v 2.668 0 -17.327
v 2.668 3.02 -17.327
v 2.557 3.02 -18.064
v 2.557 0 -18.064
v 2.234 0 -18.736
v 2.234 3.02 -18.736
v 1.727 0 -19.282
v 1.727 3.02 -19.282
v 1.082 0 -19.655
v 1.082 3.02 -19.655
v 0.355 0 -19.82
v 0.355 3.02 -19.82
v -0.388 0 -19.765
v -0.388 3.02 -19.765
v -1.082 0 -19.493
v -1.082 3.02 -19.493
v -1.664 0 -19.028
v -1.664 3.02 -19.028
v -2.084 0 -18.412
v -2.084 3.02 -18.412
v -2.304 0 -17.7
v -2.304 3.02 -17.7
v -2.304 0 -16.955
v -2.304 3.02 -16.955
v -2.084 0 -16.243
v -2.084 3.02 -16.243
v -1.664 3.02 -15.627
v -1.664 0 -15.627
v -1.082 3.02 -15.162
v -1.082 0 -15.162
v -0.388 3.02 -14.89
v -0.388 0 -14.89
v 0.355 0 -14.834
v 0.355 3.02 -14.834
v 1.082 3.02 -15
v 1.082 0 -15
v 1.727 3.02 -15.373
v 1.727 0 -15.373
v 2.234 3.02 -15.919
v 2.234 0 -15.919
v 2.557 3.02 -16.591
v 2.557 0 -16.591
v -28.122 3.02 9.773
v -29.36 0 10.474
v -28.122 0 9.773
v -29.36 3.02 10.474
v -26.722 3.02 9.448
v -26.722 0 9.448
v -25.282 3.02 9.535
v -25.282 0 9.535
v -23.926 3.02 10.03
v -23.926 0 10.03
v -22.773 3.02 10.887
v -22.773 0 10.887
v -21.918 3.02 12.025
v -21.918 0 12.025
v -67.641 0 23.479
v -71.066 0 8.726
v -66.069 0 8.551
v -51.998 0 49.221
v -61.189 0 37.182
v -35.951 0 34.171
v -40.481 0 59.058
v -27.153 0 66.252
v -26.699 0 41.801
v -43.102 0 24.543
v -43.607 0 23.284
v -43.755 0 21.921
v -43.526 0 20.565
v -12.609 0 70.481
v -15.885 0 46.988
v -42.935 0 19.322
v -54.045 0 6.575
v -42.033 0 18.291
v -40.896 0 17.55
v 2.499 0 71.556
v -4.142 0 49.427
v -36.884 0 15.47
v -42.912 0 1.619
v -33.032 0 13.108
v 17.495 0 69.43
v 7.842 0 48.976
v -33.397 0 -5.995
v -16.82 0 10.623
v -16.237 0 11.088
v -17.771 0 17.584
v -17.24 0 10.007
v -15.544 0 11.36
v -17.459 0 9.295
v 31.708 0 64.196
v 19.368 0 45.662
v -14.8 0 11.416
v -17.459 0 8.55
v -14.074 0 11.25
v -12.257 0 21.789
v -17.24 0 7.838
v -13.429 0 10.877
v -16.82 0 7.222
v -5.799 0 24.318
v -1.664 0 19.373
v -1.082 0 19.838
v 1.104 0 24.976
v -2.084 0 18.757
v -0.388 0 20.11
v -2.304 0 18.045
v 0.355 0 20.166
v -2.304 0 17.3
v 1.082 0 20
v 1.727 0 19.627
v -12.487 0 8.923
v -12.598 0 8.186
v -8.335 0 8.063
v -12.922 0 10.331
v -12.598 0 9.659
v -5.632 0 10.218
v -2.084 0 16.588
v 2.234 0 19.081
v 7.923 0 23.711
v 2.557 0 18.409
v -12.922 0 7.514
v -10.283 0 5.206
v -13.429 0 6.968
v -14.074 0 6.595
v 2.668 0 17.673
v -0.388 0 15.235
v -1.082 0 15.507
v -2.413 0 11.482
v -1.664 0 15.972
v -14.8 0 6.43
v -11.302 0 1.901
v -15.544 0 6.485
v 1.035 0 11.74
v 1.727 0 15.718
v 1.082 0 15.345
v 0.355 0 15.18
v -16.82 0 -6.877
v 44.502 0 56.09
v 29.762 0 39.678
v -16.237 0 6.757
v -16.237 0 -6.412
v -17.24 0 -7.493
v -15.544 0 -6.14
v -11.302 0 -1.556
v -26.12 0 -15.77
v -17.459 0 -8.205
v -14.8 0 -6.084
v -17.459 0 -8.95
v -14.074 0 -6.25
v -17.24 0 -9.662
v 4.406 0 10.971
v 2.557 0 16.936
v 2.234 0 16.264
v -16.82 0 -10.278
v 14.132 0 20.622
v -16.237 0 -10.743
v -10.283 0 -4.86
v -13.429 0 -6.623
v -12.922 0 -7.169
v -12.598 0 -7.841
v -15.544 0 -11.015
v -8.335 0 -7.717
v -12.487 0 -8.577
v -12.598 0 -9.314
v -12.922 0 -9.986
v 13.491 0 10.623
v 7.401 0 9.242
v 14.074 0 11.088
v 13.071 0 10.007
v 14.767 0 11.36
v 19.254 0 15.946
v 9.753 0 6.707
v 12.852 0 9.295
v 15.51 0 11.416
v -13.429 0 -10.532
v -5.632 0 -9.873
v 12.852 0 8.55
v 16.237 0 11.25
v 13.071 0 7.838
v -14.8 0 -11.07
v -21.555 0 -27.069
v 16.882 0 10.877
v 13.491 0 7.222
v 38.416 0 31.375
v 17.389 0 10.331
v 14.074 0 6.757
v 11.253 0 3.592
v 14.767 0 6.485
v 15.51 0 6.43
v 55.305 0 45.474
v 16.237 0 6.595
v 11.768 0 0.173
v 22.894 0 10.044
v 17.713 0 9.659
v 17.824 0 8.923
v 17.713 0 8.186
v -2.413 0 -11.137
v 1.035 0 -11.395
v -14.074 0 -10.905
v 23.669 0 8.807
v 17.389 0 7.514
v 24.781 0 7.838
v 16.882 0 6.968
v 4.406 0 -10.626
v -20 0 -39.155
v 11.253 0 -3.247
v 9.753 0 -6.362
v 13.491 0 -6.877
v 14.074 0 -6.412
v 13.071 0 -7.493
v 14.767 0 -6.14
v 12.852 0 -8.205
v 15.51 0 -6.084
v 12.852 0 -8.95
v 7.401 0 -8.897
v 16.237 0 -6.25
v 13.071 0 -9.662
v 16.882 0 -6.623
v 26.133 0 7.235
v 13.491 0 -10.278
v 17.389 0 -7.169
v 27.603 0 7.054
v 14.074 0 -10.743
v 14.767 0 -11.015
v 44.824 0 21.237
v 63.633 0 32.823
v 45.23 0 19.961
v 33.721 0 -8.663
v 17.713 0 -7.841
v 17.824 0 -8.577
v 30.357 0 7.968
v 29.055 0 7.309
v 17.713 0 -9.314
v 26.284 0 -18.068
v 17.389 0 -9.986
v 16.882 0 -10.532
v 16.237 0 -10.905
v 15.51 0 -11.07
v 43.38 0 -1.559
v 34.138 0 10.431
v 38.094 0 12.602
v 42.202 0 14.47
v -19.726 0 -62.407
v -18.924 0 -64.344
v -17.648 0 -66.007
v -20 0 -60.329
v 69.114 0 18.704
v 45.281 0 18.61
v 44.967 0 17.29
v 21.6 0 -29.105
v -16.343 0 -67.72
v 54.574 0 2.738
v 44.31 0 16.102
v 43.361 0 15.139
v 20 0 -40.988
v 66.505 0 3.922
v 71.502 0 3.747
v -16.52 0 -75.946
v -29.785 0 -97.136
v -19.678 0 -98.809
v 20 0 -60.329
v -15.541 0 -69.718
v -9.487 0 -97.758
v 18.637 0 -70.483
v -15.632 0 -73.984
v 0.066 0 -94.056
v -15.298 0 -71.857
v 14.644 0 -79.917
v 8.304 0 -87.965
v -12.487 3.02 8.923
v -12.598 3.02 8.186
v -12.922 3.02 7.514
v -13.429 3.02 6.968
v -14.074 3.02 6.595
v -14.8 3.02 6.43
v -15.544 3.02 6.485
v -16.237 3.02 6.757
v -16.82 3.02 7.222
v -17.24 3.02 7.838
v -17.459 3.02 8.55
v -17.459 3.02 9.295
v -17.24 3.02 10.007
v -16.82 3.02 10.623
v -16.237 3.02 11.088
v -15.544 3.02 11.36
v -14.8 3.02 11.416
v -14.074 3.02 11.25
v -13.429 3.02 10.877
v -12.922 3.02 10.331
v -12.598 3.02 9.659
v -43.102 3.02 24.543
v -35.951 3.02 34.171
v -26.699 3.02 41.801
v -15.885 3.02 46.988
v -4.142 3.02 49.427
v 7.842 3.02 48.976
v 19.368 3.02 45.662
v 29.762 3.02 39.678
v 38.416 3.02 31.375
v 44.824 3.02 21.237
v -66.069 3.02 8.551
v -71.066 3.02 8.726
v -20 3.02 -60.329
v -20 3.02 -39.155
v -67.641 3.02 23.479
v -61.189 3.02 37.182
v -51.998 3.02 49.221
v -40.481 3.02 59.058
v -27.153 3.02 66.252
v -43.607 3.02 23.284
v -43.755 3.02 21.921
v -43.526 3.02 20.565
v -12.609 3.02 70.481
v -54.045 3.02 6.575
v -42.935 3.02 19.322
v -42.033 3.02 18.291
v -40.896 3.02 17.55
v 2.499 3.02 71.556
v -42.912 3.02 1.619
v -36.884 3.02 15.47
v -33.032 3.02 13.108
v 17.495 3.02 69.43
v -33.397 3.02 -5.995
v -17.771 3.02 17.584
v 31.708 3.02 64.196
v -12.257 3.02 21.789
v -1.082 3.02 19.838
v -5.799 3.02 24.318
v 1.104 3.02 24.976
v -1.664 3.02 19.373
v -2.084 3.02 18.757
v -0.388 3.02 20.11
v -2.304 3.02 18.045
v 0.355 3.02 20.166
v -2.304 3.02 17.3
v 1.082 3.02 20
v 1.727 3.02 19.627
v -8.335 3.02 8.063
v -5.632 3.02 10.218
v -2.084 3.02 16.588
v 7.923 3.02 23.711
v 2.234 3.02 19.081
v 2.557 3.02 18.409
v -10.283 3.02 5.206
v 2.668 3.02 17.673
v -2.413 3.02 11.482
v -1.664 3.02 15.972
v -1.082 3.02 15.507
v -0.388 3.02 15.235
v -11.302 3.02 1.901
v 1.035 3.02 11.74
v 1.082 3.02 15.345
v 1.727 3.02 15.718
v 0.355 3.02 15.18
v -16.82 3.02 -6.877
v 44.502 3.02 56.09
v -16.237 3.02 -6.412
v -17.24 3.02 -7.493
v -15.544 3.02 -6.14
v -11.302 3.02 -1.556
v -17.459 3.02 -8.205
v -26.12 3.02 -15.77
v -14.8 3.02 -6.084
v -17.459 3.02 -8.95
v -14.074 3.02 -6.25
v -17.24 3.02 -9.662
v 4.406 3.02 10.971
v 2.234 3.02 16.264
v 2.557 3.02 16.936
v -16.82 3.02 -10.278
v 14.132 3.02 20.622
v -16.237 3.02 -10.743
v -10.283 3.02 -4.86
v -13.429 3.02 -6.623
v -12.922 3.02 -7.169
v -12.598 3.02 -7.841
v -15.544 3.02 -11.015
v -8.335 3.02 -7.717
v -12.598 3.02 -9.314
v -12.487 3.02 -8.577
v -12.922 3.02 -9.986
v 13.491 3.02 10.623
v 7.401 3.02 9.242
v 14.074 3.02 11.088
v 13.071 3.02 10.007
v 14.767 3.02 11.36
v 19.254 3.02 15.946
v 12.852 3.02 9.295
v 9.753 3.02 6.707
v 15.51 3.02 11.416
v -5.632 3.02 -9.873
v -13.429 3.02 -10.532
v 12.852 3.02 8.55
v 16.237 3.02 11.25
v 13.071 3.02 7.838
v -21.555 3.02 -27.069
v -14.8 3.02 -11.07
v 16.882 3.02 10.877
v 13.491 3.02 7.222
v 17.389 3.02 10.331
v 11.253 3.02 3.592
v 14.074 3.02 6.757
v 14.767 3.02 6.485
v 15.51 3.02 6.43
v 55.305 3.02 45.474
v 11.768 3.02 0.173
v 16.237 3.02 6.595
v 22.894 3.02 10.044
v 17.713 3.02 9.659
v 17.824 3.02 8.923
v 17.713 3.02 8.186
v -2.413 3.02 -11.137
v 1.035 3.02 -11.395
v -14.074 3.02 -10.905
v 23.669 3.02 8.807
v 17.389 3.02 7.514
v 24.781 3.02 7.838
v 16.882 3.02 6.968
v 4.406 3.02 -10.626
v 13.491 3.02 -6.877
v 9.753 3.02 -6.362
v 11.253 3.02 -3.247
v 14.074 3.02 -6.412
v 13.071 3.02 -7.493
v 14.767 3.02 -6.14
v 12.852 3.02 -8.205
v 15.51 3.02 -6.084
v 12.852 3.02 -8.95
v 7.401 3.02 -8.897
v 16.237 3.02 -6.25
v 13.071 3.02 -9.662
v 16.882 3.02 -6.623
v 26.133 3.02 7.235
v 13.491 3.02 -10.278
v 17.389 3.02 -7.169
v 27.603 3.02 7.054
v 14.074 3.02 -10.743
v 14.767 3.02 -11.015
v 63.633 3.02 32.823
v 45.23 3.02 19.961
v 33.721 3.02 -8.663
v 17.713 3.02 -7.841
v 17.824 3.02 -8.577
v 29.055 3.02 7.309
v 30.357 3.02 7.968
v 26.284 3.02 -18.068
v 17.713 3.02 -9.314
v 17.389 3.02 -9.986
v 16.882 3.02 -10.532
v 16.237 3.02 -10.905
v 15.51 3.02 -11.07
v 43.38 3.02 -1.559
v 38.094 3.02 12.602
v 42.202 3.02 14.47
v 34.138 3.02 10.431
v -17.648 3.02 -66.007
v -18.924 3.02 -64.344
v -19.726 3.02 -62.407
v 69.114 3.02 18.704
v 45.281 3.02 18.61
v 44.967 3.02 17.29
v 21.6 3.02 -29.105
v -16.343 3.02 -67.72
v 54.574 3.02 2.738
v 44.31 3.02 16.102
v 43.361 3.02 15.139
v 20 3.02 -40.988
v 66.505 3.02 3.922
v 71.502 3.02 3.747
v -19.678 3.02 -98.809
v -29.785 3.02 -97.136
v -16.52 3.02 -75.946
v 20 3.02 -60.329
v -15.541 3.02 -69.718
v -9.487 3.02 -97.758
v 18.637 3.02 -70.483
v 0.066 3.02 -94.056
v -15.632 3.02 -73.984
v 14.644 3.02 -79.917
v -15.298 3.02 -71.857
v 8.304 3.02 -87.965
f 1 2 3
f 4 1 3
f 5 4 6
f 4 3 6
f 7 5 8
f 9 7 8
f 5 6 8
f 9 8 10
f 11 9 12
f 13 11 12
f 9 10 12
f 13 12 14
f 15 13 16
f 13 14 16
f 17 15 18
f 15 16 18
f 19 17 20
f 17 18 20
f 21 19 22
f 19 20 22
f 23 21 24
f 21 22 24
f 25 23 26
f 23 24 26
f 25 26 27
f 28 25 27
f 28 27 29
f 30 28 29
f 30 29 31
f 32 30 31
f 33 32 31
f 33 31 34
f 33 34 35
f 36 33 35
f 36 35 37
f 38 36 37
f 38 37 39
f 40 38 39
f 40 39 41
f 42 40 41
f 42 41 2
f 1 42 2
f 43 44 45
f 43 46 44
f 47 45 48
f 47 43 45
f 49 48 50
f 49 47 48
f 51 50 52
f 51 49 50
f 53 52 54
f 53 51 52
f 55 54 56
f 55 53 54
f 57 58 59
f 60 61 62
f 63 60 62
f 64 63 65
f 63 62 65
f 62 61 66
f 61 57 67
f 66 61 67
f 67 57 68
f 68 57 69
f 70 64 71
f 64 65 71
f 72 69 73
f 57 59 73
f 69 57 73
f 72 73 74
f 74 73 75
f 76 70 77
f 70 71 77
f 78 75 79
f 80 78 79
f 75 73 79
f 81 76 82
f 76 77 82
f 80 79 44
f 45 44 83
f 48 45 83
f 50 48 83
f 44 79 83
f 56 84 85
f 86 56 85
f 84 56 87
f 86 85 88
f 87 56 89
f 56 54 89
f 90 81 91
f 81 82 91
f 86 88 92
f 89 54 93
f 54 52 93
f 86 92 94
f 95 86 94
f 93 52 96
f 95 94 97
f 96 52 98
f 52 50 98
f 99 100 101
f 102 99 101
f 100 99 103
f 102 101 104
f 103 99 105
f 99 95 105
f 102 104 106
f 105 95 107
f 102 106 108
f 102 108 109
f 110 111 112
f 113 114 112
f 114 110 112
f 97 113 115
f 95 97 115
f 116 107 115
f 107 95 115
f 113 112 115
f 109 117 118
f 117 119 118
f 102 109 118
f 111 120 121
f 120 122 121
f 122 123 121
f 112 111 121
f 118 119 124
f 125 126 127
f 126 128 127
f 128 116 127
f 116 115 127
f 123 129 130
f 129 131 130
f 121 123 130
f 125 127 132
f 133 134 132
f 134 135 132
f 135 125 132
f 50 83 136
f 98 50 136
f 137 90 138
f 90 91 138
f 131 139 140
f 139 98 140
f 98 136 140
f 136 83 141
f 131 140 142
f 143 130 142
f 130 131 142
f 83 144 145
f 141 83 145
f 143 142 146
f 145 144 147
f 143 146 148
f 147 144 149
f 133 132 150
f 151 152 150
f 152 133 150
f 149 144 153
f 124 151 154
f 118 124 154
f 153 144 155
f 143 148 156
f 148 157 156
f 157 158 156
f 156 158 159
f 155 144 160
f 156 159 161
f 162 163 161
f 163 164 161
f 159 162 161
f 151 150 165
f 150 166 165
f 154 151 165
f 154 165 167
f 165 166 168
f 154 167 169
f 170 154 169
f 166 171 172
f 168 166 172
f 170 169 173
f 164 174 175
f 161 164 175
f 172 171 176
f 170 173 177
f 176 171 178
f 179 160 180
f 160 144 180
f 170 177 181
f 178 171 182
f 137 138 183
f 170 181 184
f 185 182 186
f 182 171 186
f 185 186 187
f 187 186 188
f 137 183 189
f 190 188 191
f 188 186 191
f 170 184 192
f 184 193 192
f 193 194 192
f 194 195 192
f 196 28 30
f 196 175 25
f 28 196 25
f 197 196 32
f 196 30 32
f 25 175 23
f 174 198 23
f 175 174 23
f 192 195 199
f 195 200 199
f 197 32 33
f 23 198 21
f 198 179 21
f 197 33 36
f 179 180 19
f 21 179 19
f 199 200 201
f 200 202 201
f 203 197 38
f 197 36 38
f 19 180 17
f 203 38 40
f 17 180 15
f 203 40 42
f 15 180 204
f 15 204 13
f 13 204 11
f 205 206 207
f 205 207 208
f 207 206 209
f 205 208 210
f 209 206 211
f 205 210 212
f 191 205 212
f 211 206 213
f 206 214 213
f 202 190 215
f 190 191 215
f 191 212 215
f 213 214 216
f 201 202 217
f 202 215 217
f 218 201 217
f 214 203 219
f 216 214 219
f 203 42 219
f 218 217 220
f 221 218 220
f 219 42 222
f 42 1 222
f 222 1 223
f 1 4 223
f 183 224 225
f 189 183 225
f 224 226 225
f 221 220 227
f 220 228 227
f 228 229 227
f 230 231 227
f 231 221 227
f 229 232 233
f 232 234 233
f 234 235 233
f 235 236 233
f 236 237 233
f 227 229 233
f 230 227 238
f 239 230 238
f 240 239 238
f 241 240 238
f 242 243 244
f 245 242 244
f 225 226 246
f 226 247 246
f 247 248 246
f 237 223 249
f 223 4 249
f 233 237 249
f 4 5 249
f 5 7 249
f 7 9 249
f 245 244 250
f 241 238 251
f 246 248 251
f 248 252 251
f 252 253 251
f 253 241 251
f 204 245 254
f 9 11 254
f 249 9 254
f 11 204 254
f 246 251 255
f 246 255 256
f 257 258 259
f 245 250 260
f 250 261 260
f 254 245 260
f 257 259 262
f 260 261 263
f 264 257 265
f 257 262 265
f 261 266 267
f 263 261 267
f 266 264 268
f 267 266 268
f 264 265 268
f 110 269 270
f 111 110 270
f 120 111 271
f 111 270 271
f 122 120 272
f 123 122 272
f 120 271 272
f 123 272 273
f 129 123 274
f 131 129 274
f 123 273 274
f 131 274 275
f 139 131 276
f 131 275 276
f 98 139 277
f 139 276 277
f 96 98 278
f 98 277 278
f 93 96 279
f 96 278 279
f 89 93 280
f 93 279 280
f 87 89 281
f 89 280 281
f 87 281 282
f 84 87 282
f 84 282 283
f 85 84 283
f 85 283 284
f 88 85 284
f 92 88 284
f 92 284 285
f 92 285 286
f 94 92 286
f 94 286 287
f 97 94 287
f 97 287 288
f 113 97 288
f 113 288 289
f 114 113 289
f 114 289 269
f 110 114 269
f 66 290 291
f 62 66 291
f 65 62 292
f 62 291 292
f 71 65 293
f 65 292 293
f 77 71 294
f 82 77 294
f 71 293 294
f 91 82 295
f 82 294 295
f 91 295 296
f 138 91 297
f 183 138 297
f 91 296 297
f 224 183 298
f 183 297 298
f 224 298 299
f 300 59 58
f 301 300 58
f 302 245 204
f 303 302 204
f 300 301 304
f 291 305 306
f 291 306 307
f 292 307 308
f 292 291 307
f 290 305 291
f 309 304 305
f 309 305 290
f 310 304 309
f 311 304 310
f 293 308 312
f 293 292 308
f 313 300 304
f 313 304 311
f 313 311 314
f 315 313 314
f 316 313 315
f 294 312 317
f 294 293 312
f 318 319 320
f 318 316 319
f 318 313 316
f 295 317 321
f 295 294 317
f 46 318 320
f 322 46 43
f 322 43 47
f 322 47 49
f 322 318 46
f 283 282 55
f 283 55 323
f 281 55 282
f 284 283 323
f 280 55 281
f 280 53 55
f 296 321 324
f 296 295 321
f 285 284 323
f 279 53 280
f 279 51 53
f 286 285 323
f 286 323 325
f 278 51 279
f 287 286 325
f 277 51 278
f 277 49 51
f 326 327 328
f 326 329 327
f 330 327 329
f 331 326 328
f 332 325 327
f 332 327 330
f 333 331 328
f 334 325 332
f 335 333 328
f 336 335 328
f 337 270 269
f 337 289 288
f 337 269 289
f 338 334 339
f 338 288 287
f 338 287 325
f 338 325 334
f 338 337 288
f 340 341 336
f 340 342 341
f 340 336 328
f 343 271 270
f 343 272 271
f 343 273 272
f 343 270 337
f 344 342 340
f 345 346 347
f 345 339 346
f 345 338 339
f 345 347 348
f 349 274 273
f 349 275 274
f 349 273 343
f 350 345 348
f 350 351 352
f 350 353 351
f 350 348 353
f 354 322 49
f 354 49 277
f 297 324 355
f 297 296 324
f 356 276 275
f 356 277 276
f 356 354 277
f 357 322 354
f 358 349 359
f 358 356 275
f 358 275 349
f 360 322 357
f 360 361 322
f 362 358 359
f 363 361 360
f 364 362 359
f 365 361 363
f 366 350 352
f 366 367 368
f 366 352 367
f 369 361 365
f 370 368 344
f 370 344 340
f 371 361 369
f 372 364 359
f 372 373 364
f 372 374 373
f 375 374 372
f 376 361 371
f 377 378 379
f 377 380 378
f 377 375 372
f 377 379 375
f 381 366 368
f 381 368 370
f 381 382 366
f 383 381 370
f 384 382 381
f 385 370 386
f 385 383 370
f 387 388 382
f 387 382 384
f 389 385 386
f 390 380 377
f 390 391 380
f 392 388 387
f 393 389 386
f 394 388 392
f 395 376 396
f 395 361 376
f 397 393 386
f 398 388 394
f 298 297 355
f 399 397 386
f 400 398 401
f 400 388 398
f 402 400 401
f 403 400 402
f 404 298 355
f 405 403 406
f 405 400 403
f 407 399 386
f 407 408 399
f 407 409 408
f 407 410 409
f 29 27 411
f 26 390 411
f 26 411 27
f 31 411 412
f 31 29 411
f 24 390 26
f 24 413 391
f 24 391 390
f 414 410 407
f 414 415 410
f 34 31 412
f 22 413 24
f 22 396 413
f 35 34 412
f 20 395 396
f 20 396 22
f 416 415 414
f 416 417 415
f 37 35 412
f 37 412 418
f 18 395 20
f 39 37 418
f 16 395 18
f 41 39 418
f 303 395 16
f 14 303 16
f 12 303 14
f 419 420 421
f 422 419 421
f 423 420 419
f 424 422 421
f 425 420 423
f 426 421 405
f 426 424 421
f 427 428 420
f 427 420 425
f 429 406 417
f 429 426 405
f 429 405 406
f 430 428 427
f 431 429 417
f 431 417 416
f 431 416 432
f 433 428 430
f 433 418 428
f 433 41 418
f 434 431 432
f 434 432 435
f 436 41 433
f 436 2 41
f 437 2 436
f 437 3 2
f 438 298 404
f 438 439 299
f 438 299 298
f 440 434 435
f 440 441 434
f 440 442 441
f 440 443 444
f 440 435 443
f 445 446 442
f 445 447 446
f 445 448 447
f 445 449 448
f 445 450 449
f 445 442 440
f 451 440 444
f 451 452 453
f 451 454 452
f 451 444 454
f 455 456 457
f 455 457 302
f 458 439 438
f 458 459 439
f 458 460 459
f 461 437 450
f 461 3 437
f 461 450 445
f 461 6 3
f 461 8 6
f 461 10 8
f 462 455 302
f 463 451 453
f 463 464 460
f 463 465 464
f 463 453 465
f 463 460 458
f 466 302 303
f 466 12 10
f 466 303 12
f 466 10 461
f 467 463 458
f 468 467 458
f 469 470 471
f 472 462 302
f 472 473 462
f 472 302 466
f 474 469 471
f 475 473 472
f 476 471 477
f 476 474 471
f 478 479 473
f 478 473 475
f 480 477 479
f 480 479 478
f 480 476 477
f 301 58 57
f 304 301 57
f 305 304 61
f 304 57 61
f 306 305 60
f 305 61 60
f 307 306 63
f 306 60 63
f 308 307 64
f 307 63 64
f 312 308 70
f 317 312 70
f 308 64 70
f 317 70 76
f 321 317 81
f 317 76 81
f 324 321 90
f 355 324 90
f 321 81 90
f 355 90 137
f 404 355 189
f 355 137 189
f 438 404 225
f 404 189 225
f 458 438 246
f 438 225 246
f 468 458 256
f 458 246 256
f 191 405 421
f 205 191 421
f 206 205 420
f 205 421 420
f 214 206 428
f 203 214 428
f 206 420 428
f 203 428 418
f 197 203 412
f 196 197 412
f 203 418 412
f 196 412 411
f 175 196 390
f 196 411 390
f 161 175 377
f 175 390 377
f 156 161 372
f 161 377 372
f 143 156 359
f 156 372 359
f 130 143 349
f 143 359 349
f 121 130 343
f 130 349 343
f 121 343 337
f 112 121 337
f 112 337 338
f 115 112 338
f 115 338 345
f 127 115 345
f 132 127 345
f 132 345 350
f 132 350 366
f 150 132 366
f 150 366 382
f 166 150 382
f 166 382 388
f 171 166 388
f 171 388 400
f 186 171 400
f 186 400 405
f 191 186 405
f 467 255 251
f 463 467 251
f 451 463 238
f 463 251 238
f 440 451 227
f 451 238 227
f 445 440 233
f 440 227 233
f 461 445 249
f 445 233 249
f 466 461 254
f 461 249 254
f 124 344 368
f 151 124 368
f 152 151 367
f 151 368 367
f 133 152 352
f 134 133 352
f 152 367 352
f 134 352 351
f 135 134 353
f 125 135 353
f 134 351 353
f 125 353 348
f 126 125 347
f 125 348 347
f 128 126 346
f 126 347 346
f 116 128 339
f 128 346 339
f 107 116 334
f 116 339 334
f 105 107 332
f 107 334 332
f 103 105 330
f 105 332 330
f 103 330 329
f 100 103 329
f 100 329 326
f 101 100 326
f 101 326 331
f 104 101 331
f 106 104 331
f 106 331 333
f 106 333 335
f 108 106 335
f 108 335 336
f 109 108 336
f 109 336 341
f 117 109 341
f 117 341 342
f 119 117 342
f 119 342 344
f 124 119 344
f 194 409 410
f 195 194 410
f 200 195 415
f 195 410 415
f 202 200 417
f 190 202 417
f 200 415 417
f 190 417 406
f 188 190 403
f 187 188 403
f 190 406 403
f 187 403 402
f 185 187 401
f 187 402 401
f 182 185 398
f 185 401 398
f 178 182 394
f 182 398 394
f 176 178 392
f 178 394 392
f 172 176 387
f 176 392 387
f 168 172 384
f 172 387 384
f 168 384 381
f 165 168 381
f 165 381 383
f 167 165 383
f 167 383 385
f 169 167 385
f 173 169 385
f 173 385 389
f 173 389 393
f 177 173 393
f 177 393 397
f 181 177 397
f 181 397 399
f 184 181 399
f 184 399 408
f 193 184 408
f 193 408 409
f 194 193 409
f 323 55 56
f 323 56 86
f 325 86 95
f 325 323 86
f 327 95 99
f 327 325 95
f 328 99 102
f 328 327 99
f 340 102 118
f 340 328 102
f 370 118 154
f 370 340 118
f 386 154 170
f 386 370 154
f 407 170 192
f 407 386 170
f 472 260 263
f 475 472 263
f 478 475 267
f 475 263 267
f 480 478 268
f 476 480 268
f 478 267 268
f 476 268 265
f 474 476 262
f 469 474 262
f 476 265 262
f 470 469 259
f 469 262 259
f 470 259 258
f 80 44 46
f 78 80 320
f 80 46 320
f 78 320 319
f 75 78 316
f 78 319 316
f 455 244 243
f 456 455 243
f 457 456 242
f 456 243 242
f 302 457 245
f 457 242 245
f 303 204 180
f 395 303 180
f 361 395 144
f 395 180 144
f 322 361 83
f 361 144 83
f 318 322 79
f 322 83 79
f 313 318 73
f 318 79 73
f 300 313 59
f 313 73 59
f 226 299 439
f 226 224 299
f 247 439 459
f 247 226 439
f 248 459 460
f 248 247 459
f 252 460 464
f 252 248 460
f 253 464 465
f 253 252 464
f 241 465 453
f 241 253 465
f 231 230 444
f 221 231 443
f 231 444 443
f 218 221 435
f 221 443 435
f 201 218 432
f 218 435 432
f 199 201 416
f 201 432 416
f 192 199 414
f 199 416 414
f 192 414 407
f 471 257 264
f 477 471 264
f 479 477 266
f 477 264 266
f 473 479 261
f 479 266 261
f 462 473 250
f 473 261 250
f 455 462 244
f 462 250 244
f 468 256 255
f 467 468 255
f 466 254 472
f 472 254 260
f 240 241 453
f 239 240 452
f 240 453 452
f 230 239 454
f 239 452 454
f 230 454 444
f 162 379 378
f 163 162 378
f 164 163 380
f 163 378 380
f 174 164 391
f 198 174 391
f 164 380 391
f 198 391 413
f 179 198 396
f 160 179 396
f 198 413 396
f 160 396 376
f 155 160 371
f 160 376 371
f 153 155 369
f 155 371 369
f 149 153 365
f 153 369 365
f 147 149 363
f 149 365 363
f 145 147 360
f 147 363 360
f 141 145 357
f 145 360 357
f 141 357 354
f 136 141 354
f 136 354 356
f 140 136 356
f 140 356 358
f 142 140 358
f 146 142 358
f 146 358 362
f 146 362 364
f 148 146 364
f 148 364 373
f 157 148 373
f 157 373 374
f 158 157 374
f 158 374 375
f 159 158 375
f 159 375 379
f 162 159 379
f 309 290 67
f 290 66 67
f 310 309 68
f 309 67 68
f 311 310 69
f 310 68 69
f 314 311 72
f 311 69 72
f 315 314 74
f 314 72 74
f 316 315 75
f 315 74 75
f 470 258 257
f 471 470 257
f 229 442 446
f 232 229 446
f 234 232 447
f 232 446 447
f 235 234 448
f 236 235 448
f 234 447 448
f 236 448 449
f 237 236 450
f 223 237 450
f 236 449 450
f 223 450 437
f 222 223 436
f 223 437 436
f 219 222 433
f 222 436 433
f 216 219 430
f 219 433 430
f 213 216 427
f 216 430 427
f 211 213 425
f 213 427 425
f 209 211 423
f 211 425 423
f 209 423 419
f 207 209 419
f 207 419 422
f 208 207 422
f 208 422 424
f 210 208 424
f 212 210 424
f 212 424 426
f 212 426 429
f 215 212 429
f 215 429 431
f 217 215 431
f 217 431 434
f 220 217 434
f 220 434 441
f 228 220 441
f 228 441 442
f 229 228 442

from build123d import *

# Parameters (mm, degrees)
BOSS_EXTRUDE1_DEPTH = 3.02
CUT_EXTRUDE2_DEPTH  = 4.02
FILLET6_R           = 5
SKETCH7_R           = 25
BOSS_EXTRUDE5_DEPTH = 3.02
FILLET7_R           = 5
SKETCH8_R           = 11.6
CUT_EXTRUDE3_DEPTH  = 4.0200001
SKETCH10_R          = 2.5
CUT_EXTRUDE4_DEPTH  = 4.0200001


with BuildPart() as part:
    # Sketch1 → Boss-Extrude1 (new body)
    with BuildSketch(Plane(origin=(0, 0, 0), x_dir=(1, 0, 0), z_dir=(0, 1, 0))):
        with BuildLine():
            Line((-29.785324721, 97.135958487), (-16.519810347, 75.945721858))
            ThreePointArc((-16.519810347, 75.945721858), (-15.347350146, 70.779086196), (-17.648053563, 66.006712491))
            ThreePointArc((-17.648053563, 66.006712491), (-19.388749036, 63.401577615), (-20, 60.328611505))
            Line((-20, 60.328611505), (-20, 39.154861291))
            ThreePointArc((-20, 39.154861291), (-33.397395417, 5.995144025), (-66.069350322, -8.551347504))
            Line((-66.069350322, -8.551347504), (-71.066304458, -8.725844988))
            ThreePointArc((-71.066304458, -8.725844988), (2.498803964, -71.556383215), (71.501874688, -3.747254467))
            Line((71.501874688, -3.747254467), (66.504920553, -3.921751951))
            ThreePointArc((66.504920553, -3.921751951), (33.721031142, 8.662804123), (20, 40.987527801))
            Line((20, 40.987527801), (20, 60.328611505))
            ThreePointArc((20, 60.328611505), (4.388325927, 91.285675923), (-29.785324721, 97.135958487))
        make_face()
    extrude(amount=BOSS_EXTRUDE1_DEPTH)

    # Sketch6 → Cut-Extrude2 (cut, through all)
    with BuildSketch(Plane(origin=(0, 3.02, 0), x_dir=(1, 0, 0), z_dir=(0, 1, 0))):
        with BuildLine():
            ThreePointArc((-45.588380428, -19.541227443), (1.807988114, -49.567037222), (46.890896023, -16.167989057))
            ThreePointArc((46.890896023, -16.167989057), (28.340616971, -6.479645741), (14.25203647, 8.995778278))
            ThreePointArc((14.25203647, 8.995778278), (3.327119381, -16.521950459), (-16.623047064, 2.77828664))
            ThreePointArc((-16.623047064, 2.77828664), (-29.443436546, -10.538704339), (-45.588380428, -19.541227443))
        make_face()
    extrude(amount=-CUT_EXTRUDE2_DEPTH, mode=Mode.SUBTRACT)

    # Fillet6
    fillet6_edges = [part.edges().sort_by_distance(p)[0] for p in [
        (-45.588380428, 1.51, 19.541227443),
        (46.890896023, 1.51, 16.167989057),
    ]]
    fillet(fillet6_edges, radius=FILLET6_R)

    # Sketch7 → Boss-Extrude5 (add)
    with BuildSketch(Plane(origin=(0, 3.02, 0), x_dir=(1, 0, 0), z_dir=(0, 1, 0))):
        Circle(SKETCH7_R)
    extrude(amount=-BOSS_EXTRUDE5_DEPTH)

    # Fillet7
    fillet7_edges = [part.edges().sort_by_distance(p)[0] for p in [
        (24.755757684, 1.51, 3.486038077),
        (-24.252747569, 1.51, 6.066649432),
    ]]
    fillet(fillet7_edges, radius=FILLET7_R)

    # Sketch8 → Cut-Extrude3 (cut, through all)
    with BuildSketch(Plane(origin=(0, 3.02, 0), x_dir=(1, 0, 0), z_dir=(0, 1, 0))):
        with Locations((0.168160547, -0.172559626)):
            Circle(SKETCH8_R)
    extrude(amount=-CUT_EXTRUDE3_DEPTH, mode=Mode.SUBTRACT)

    # Sketch10 → Cut-Extrude4 (cut, through all)
    with BuildSketch(Plane(origin=(0, 3.02, 0), x_dir=(1, 0, 0), z_dir=(0, 1, 0))):
        with Locations((0.168160547, -17.672559626)):
            Circle(SKETCH10_R)
        with Locations((-14.987284019, -8.922559626)):
            Circle(SKETCH10_R)
        with Locations((-14.987284019, 8.577440374)):
            Circle(SKETCH10_R)
        with Locations((0.168160547, 17.327440374)):
            Circle(SKETCH10_R)
        with Locations((15.323605113, 8.577440374)):
            Circle(SKETCH10_R)
        with Locations((15.323605113, -8.922559626)):
            Circle(SKETCH10_R)
    extrude(amount=-CUT_EXTRUDE4_DEPTH, mode=Mode.SUBTRACT)


solid = part.part
